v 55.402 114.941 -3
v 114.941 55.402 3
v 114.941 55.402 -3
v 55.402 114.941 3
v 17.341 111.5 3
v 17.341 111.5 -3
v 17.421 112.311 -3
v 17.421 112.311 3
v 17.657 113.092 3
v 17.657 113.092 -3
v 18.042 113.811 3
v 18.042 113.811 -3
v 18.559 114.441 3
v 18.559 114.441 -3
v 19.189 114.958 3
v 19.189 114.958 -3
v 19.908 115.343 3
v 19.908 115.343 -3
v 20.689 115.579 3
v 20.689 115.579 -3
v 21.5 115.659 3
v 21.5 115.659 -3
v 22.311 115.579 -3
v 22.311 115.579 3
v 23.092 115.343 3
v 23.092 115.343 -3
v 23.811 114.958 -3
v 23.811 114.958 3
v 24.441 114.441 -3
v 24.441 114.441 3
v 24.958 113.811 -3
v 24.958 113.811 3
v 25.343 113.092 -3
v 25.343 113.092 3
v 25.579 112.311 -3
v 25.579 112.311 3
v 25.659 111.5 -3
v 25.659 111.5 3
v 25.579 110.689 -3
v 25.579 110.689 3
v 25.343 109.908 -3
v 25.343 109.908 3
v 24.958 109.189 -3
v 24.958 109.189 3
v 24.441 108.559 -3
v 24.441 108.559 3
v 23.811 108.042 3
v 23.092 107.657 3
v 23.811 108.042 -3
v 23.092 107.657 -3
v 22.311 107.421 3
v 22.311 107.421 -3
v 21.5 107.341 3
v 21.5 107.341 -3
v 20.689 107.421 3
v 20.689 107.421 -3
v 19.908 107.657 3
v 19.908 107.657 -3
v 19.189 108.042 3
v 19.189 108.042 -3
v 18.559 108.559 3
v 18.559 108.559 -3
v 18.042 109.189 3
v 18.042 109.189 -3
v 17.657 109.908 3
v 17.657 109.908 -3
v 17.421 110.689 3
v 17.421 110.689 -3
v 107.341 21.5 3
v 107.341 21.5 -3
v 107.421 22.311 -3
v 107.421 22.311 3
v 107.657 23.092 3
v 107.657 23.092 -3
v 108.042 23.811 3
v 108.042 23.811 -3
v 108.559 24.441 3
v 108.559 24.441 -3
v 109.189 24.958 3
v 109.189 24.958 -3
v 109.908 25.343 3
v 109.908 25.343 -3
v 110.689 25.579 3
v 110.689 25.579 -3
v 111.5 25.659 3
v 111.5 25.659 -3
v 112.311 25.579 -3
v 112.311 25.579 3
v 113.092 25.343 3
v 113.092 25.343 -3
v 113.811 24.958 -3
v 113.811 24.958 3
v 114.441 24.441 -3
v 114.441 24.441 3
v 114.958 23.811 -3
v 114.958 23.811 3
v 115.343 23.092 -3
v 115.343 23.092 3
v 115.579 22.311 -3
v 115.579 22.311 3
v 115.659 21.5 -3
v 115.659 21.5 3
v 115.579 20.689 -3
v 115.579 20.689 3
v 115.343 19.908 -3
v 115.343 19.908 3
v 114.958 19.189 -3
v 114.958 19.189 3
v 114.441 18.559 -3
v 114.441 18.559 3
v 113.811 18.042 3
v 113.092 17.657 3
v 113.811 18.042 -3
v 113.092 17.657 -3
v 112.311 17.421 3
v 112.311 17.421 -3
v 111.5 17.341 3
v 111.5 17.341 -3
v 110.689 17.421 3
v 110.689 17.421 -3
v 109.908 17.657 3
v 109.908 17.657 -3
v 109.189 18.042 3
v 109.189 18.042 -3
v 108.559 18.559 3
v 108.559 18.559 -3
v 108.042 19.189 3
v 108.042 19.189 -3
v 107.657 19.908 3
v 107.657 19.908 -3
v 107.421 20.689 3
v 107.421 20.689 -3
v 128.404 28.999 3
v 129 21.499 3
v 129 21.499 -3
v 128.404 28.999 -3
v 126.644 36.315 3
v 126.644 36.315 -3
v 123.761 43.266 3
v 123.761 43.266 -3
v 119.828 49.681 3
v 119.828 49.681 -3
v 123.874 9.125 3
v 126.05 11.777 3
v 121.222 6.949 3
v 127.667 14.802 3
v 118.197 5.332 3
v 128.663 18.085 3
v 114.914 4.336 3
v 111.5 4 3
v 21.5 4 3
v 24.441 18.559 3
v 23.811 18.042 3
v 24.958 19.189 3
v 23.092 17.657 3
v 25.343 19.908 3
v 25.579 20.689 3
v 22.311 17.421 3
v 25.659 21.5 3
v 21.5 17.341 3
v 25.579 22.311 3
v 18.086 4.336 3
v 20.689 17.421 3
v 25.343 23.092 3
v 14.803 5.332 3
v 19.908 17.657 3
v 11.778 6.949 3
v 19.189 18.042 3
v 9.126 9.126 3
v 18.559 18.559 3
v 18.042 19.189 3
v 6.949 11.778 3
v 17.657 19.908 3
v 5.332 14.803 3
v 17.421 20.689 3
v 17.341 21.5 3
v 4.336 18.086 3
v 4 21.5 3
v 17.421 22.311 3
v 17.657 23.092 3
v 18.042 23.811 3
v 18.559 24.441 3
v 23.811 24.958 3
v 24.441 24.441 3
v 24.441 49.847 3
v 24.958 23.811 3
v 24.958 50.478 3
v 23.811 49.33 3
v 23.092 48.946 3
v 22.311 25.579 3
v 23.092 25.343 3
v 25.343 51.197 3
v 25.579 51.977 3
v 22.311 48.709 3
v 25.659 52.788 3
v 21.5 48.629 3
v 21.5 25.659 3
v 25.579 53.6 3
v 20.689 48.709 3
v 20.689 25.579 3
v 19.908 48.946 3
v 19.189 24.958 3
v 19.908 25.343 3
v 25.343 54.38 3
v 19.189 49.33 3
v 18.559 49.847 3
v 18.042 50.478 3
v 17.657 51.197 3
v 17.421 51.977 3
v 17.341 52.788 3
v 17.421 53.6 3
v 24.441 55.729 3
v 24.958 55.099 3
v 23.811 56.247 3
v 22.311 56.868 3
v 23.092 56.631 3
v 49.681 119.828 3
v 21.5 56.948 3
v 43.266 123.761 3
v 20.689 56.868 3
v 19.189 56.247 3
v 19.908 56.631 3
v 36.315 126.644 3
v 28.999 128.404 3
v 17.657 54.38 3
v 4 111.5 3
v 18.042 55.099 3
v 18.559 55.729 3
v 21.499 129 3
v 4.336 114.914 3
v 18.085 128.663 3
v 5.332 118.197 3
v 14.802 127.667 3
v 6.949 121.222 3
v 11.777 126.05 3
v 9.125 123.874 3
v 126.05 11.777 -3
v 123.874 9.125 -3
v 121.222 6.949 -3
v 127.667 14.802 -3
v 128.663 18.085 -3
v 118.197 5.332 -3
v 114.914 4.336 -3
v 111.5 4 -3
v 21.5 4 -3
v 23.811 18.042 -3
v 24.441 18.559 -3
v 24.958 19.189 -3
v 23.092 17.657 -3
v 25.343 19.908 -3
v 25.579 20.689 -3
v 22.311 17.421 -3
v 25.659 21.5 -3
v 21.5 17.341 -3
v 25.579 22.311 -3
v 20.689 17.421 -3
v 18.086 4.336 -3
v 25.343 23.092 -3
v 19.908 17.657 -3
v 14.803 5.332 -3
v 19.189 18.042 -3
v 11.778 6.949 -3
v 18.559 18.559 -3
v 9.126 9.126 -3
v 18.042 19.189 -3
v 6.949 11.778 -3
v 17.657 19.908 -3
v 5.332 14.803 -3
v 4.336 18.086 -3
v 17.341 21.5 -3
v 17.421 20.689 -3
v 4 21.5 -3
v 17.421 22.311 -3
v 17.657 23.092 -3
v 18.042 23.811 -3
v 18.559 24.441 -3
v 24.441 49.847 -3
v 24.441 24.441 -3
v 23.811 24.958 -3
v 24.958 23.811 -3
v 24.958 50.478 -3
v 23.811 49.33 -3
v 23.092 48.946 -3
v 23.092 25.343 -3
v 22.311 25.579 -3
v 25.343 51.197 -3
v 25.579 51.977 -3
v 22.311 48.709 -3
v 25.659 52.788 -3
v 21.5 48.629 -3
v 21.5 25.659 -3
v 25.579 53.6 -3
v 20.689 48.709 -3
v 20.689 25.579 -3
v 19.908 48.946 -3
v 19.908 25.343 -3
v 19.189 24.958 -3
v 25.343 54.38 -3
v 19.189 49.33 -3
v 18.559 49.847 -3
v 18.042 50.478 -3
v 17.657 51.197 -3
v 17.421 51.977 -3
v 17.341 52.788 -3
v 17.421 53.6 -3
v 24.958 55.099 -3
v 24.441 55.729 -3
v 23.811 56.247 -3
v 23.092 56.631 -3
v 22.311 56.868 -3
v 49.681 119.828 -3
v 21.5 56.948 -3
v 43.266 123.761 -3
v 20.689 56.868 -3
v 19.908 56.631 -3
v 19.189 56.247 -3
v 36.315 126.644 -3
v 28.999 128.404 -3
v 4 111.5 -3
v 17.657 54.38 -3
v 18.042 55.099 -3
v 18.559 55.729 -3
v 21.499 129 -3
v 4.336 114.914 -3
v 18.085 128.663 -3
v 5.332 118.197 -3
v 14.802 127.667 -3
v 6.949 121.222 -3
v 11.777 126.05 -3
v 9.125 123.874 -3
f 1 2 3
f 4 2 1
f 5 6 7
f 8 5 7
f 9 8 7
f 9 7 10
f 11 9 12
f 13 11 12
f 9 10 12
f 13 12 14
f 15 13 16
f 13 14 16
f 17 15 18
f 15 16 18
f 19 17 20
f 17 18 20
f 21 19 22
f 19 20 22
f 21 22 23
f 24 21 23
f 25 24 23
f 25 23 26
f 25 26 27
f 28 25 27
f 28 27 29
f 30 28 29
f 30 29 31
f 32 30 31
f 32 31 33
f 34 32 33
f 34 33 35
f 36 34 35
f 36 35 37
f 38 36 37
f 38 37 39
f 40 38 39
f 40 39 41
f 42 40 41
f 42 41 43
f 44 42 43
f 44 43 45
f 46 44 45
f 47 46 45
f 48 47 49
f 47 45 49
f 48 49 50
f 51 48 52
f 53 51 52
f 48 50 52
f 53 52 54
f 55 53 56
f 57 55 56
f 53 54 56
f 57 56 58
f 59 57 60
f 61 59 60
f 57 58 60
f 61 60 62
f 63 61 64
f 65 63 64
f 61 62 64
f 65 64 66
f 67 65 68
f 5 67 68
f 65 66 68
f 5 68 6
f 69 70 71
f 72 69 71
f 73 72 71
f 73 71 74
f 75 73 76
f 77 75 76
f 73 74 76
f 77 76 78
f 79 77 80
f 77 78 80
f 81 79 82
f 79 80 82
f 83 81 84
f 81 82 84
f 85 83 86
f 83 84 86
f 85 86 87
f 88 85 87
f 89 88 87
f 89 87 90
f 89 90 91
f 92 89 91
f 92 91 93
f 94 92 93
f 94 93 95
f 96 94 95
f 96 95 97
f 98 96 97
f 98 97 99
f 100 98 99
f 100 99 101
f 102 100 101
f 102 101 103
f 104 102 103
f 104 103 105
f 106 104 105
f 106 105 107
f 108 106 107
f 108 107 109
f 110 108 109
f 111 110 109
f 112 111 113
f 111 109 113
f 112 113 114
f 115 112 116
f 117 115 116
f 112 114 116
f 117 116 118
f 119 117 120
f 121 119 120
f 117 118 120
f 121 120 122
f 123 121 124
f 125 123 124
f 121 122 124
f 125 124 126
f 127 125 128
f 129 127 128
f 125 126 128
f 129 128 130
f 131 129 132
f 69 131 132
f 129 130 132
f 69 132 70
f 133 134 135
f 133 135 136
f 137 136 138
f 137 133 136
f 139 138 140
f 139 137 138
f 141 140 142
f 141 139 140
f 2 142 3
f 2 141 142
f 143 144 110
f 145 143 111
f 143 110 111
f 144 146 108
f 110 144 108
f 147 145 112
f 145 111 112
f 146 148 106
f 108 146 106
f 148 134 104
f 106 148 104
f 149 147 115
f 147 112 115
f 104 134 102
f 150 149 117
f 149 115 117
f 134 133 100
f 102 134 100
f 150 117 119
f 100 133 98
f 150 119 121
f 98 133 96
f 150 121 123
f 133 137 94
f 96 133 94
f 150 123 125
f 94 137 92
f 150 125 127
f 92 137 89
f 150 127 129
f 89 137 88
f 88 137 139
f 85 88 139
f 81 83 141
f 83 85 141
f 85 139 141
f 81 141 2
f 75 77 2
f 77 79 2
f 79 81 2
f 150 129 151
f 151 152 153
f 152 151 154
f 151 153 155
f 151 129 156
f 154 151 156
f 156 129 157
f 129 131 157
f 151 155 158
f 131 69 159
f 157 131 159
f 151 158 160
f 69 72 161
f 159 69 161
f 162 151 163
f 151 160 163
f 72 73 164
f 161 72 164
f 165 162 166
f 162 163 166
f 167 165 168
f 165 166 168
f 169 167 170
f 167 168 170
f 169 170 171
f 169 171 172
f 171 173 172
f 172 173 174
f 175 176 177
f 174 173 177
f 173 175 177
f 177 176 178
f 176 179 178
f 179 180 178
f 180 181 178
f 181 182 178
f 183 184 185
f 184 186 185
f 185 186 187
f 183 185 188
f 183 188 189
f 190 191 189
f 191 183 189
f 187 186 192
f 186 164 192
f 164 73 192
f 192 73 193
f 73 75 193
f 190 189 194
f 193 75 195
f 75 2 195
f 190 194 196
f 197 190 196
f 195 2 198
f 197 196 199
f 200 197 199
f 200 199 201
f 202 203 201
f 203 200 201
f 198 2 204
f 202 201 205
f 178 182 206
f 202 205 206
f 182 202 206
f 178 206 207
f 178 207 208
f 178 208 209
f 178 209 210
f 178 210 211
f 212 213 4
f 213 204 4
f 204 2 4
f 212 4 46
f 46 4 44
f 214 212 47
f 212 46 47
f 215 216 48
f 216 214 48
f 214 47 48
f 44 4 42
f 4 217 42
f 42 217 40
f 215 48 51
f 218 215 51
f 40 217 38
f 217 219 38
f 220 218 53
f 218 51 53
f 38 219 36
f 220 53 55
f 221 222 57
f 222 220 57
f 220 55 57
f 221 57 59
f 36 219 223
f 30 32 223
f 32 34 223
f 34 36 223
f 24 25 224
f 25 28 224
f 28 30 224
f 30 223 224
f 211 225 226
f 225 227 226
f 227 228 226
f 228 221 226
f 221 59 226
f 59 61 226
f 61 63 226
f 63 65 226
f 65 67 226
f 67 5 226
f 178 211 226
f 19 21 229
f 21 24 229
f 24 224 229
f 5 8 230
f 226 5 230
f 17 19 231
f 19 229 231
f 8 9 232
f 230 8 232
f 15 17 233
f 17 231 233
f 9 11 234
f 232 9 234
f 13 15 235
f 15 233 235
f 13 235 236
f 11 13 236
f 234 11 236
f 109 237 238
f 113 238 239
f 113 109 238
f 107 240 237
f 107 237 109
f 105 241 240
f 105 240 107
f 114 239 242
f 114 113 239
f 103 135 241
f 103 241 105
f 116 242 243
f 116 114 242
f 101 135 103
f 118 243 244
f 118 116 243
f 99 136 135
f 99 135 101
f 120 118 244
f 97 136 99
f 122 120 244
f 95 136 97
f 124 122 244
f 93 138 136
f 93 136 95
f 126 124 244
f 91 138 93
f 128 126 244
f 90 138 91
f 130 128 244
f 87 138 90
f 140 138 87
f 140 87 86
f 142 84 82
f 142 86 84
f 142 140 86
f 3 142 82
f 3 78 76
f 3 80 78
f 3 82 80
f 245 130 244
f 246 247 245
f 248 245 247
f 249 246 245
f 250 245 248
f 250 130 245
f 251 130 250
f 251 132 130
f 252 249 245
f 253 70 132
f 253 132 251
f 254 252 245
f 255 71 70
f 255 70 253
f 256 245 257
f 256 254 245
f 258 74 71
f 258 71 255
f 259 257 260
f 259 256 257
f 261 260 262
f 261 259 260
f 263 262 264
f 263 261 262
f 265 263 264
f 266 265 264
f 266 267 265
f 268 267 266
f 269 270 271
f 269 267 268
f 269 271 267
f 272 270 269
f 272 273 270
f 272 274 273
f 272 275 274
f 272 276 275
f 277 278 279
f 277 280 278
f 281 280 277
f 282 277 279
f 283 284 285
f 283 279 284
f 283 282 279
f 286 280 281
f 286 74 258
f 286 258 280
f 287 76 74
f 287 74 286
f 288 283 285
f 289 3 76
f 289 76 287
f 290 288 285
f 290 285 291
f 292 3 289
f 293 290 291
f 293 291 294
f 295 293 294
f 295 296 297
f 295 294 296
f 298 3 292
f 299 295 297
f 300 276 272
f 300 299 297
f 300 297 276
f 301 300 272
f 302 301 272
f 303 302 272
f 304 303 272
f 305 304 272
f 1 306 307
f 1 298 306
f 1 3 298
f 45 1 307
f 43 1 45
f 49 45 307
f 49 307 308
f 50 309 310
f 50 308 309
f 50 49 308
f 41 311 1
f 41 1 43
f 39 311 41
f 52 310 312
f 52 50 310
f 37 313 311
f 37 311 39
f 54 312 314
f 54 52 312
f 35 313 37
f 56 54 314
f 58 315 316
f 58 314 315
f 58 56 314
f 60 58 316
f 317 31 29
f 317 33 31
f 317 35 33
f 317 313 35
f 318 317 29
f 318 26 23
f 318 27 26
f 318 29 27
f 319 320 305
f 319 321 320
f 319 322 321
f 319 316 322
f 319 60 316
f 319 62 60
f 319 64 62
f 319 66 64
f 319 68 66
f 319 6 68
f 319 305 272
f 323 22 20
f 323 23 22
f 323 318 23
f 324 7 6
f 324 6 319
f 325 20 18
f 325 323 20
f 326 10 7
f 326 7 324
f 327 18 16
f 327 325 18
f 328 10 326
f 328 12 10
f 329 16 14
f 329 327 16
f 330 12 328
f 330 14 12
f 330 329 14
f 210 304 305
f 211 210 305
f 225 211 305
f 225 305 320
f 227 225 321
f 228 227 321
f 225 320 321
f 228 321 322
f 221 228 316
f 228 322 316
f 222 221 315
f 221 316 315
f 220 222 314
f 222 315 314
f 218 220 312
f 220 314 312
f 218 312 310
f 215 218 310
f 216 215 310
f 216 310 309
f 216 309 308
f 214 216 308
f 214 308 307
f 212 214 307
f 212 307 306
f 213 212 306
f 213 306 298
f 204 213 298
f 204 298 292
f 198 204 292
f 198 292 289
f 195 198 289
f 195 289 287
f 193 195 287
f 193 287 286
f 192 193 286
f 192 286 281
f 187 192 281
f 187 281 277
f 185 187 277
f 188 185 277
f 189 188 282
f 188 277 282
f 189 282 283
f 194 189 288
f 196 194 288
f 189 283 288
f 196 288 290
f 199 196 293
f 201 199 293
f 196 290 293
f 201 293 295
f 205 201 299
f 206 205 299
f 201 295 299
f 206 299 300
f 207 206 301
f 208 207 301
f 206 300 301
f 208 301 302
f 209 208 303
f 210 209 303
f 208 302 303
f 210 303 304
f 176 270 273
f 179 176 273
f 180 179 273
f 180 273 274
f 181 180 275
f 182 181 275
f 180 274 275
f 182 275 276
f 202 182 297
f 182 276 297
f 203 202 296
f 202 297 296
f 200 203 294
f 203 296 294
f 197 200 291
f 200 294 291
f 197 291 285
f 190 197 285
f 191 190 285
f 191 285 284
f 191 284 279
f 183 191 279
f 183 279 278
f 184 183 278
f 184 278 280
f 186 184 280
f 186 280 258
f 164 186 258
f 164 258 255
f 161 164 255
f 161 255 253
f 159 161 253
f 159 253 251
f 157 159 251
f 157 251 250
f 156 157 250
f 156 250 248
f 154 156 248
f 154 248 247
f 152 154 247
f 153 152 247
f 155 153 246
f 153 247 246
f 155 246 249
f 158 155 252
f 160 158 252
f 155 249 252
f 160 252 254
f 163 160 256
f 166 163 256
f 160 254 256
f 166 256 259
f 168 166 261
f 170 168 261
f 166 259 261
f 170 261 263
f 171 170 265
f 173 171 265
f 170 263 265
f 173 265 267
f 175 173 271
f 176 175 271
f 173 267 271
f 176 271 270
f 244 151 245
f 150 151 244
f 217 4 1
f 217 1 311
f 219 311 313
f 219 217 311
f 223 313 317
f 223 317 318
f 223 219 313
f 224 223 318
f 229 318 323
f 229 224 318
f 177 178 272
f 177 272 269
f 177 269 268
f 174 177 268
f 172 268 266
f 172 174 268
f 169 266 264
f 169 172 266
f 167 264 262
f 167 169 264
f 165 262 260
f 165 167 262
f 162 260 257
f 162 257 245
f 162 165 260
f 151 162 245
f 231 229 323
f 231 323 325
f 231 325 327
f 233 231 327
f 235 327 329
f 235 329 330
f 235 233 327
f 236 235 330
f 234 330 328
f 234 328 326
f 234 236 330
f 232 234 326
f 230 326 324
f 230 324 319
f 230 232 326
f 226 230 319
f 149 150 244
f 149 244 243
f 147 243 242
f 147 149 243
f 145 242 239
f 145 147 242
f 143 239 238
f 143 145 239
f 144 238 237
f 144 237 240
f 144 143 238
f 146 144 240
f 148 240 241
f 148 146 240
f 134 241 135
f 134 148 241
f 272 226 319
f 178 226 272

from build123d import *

# Parameters (mm, degrees)
BOSS_EXTRUDE1_DEPTH      = 3
FILLET1_R                = 21.5
FILLET2_R                = 52
CUT_EXTRUDE1_DEPTH       = 189.18607812481773
F_5_16_CLEARANCE_HOLE1_D = 8.3185


with BuildPart() as part:
    # Sketch1 → Boss-Extrude1 (new, symmetric)
    with BuildSketch(Plane.XY):
        Polygon((0, 0), (0, 133), (42.999999999999986, 133), (133, 42.99999999999999), (133, 9.06e-15), align=None)
    extrude(amount=BOSS_EXTRUDE1_DEPTH, both=True)

    # Fillet1
    fillet1_edges = [part.edges().sort_by_distance(p)[0] for p in [
        (0, 0, 0),
        (0, 133, 0),
        (133, 9.06e-15, 0),
    ]]
    fillet(fillet1_edges, radius=FILLET1_R)

    # Fillet2
    # the kernel refuses this fillet: 52 mm, written as the material it takes off along each edge
    with BuildSketch(Plane(origin=(133, 43, -56.84767436170304), x_dir=(-0.7071067811865476, 0.7071067811865476, 0), z_dir=(0, 0, 1))) as fillet2_piece_1:
        with BuildLine():
            CenterArc((21.539069744681207, 52.00000000000001), FILLET2_R, 225.07350833515432, 44.926491664845685)
            Line((-15.183278672480162, 15.183303696167892), (-18.855513514196304, 11.501634065784673))
            ThreePointArc((-18.855513514196304, 11.501634065784673), (-18.87975105768081, 11.52584053334073), (-3.6769552621700394, -3.6769552621700394))
            Line((-3.6769552621700394, -3.6769552621700394), (-4.9e-15, -5.200000000000005))
            Line((-4.9e-15, -5.200000000000005), (21.539069744681218, -5.199999999999996))
            Line((21.539069744681218, -5.199999999999996), (21.539069744681214, 4.7e-16))
        make_face()
    extrude(amount=113.69534872340608, mode=Mode.SUBTRACT)
    with BuildSketch(Plane(origin=(42.999999999999986, 133, 56.847674361702985), x_dir=(-0.9999999999996605, -8.240534738615283e-07, 0), z_dir=(0, 0, -1))) as fillet2_piece_2:
        with BuildLine():
            CenterArc((21.539173195539043, -51.9999571492017), FILLET2_R, 90.07355554994047, 44.926491664845685)
            Line((-15.230409726226513, -15.230434827591285), (-18.90736801840307, -11.55348259543025))
            Line((-18.90736801840307, -11.55348259543025), (-3.676958292176556, 3.6769522321610486))
            Line((-3.676958292176556, 3.6769522321610486), (-4.28507806408e-06, 5.199999999998223))
            ThreePointArc((-4.28507806408e-06, 5.199999999998223), (21.499995714914625, 5.200017717147912), (21.46574062621809, 5.1999957149201785))
            Line((21.46574062621809, 5.1999957149201785), (21.472416314338172, 0))
        make_face()
    extrude(amount=113.69534872340597, mode=Mode.SUBTRACT)

    # Sketch3 → Cut-Extrude1 (cut, through all)
    with BuildSketch(Plane.XY.offset(3)):
        with BuildLine():
            Line((117.76956733680983, 58.23043266319015), (58.23043266319017, 117.76956733680981))
            ThreePointArc((58.23043266319017, 117.76956733680981), (41.3784881824358, 129.03426172642116), (21.499999999999996, 133))
            ThreePointArc((21.499999999999996, 133), (6.2972042044892405, 126.70279579551078), (3.47e-15, 111.50000000000001))
            Line((3.47e-15, 111.50000000000001), (0, 21.5))
            ThreePointArc((0, 21.5), (6.297204204489223, 6.297204204489235), (21.49999999999999, 3.47e-15))
            Line((21.49999999999999, 3.47e-15), (111.50000000000001, 1.041e-14))
            ThreePointArc((111.50000000000001, 1.041e-14), (126.70279579551078, 6.297204204489239), (133, 21.500000000000007))
            ThreePointArc((133, 21.500000000000007), (129.03426172642114, 41.37848818243579), (117.76956733680983, 58.23043266319015))
        make_face()
        with BuildLine():
            Line((114.94114021206362, 55.40200553844396), (55.402005538443966, 114.94114021206363))
            ThreePointArc((55.402005538443966, 114.94114021206363), (39.84708125964561, 125.33902242576387), (21.49854269401705, 128.9999999393217))
            ThreePointArc((21.49854269401705, 128.9999999393217), (9.12511610449009, 123.87385342456624), (4.0000000000000036, 111.50000000000001))
            Line((4.0000000000000036, 111.50000000000001), (4, 21.500000000000004))
            ThreePointArc((4, 21.500000000000004), (9.125631329235414, 9.125631329235425), (21.499999999999996, 4.0000000000000036))
            Line((21.499999999999996, 4.0000000000000036), (111.50000000000001, 4.000000000000011))
            ThreePointArc((111.50000000000001, 4.000000000000011), (123.8738534245646, 9.125116104488455), (128.9999999393217, 21.49854269401244))
            ThreePointArc((128.9999999393217, 21.49854269401244), (125.33902242576474, 39.847081259643474), (114.94114021206362, 55.40200553844396))
        make_face(mode=Mode.SUBTRACT)
    extrude(amount=-CUT_EXTRUDE1_DEPTH, mode=Mode.SUBTRACT)


with BuildPart() as cut_extrude1_kept_piece:
    # of the separate pieces the step leaves, the one the design keeps (cut_extrude1_pieces_kept)
    add(part.part.solids().sort_by_distance((128.999999939, 21.498542694, -3))[0])

    # 5/16 Clearance Hole1 (through all)
    with Locations(Plane.XY.offset(3)):
        with Locations((21.5, 111.5), (21.5, 52.7884), (21.5, 21.5), (111.5, 21.5)):
            Hole(F_5_16_CLEARANCE_HOLE1_D / 2)


solid = cut_extrude1_kept_piece.part
